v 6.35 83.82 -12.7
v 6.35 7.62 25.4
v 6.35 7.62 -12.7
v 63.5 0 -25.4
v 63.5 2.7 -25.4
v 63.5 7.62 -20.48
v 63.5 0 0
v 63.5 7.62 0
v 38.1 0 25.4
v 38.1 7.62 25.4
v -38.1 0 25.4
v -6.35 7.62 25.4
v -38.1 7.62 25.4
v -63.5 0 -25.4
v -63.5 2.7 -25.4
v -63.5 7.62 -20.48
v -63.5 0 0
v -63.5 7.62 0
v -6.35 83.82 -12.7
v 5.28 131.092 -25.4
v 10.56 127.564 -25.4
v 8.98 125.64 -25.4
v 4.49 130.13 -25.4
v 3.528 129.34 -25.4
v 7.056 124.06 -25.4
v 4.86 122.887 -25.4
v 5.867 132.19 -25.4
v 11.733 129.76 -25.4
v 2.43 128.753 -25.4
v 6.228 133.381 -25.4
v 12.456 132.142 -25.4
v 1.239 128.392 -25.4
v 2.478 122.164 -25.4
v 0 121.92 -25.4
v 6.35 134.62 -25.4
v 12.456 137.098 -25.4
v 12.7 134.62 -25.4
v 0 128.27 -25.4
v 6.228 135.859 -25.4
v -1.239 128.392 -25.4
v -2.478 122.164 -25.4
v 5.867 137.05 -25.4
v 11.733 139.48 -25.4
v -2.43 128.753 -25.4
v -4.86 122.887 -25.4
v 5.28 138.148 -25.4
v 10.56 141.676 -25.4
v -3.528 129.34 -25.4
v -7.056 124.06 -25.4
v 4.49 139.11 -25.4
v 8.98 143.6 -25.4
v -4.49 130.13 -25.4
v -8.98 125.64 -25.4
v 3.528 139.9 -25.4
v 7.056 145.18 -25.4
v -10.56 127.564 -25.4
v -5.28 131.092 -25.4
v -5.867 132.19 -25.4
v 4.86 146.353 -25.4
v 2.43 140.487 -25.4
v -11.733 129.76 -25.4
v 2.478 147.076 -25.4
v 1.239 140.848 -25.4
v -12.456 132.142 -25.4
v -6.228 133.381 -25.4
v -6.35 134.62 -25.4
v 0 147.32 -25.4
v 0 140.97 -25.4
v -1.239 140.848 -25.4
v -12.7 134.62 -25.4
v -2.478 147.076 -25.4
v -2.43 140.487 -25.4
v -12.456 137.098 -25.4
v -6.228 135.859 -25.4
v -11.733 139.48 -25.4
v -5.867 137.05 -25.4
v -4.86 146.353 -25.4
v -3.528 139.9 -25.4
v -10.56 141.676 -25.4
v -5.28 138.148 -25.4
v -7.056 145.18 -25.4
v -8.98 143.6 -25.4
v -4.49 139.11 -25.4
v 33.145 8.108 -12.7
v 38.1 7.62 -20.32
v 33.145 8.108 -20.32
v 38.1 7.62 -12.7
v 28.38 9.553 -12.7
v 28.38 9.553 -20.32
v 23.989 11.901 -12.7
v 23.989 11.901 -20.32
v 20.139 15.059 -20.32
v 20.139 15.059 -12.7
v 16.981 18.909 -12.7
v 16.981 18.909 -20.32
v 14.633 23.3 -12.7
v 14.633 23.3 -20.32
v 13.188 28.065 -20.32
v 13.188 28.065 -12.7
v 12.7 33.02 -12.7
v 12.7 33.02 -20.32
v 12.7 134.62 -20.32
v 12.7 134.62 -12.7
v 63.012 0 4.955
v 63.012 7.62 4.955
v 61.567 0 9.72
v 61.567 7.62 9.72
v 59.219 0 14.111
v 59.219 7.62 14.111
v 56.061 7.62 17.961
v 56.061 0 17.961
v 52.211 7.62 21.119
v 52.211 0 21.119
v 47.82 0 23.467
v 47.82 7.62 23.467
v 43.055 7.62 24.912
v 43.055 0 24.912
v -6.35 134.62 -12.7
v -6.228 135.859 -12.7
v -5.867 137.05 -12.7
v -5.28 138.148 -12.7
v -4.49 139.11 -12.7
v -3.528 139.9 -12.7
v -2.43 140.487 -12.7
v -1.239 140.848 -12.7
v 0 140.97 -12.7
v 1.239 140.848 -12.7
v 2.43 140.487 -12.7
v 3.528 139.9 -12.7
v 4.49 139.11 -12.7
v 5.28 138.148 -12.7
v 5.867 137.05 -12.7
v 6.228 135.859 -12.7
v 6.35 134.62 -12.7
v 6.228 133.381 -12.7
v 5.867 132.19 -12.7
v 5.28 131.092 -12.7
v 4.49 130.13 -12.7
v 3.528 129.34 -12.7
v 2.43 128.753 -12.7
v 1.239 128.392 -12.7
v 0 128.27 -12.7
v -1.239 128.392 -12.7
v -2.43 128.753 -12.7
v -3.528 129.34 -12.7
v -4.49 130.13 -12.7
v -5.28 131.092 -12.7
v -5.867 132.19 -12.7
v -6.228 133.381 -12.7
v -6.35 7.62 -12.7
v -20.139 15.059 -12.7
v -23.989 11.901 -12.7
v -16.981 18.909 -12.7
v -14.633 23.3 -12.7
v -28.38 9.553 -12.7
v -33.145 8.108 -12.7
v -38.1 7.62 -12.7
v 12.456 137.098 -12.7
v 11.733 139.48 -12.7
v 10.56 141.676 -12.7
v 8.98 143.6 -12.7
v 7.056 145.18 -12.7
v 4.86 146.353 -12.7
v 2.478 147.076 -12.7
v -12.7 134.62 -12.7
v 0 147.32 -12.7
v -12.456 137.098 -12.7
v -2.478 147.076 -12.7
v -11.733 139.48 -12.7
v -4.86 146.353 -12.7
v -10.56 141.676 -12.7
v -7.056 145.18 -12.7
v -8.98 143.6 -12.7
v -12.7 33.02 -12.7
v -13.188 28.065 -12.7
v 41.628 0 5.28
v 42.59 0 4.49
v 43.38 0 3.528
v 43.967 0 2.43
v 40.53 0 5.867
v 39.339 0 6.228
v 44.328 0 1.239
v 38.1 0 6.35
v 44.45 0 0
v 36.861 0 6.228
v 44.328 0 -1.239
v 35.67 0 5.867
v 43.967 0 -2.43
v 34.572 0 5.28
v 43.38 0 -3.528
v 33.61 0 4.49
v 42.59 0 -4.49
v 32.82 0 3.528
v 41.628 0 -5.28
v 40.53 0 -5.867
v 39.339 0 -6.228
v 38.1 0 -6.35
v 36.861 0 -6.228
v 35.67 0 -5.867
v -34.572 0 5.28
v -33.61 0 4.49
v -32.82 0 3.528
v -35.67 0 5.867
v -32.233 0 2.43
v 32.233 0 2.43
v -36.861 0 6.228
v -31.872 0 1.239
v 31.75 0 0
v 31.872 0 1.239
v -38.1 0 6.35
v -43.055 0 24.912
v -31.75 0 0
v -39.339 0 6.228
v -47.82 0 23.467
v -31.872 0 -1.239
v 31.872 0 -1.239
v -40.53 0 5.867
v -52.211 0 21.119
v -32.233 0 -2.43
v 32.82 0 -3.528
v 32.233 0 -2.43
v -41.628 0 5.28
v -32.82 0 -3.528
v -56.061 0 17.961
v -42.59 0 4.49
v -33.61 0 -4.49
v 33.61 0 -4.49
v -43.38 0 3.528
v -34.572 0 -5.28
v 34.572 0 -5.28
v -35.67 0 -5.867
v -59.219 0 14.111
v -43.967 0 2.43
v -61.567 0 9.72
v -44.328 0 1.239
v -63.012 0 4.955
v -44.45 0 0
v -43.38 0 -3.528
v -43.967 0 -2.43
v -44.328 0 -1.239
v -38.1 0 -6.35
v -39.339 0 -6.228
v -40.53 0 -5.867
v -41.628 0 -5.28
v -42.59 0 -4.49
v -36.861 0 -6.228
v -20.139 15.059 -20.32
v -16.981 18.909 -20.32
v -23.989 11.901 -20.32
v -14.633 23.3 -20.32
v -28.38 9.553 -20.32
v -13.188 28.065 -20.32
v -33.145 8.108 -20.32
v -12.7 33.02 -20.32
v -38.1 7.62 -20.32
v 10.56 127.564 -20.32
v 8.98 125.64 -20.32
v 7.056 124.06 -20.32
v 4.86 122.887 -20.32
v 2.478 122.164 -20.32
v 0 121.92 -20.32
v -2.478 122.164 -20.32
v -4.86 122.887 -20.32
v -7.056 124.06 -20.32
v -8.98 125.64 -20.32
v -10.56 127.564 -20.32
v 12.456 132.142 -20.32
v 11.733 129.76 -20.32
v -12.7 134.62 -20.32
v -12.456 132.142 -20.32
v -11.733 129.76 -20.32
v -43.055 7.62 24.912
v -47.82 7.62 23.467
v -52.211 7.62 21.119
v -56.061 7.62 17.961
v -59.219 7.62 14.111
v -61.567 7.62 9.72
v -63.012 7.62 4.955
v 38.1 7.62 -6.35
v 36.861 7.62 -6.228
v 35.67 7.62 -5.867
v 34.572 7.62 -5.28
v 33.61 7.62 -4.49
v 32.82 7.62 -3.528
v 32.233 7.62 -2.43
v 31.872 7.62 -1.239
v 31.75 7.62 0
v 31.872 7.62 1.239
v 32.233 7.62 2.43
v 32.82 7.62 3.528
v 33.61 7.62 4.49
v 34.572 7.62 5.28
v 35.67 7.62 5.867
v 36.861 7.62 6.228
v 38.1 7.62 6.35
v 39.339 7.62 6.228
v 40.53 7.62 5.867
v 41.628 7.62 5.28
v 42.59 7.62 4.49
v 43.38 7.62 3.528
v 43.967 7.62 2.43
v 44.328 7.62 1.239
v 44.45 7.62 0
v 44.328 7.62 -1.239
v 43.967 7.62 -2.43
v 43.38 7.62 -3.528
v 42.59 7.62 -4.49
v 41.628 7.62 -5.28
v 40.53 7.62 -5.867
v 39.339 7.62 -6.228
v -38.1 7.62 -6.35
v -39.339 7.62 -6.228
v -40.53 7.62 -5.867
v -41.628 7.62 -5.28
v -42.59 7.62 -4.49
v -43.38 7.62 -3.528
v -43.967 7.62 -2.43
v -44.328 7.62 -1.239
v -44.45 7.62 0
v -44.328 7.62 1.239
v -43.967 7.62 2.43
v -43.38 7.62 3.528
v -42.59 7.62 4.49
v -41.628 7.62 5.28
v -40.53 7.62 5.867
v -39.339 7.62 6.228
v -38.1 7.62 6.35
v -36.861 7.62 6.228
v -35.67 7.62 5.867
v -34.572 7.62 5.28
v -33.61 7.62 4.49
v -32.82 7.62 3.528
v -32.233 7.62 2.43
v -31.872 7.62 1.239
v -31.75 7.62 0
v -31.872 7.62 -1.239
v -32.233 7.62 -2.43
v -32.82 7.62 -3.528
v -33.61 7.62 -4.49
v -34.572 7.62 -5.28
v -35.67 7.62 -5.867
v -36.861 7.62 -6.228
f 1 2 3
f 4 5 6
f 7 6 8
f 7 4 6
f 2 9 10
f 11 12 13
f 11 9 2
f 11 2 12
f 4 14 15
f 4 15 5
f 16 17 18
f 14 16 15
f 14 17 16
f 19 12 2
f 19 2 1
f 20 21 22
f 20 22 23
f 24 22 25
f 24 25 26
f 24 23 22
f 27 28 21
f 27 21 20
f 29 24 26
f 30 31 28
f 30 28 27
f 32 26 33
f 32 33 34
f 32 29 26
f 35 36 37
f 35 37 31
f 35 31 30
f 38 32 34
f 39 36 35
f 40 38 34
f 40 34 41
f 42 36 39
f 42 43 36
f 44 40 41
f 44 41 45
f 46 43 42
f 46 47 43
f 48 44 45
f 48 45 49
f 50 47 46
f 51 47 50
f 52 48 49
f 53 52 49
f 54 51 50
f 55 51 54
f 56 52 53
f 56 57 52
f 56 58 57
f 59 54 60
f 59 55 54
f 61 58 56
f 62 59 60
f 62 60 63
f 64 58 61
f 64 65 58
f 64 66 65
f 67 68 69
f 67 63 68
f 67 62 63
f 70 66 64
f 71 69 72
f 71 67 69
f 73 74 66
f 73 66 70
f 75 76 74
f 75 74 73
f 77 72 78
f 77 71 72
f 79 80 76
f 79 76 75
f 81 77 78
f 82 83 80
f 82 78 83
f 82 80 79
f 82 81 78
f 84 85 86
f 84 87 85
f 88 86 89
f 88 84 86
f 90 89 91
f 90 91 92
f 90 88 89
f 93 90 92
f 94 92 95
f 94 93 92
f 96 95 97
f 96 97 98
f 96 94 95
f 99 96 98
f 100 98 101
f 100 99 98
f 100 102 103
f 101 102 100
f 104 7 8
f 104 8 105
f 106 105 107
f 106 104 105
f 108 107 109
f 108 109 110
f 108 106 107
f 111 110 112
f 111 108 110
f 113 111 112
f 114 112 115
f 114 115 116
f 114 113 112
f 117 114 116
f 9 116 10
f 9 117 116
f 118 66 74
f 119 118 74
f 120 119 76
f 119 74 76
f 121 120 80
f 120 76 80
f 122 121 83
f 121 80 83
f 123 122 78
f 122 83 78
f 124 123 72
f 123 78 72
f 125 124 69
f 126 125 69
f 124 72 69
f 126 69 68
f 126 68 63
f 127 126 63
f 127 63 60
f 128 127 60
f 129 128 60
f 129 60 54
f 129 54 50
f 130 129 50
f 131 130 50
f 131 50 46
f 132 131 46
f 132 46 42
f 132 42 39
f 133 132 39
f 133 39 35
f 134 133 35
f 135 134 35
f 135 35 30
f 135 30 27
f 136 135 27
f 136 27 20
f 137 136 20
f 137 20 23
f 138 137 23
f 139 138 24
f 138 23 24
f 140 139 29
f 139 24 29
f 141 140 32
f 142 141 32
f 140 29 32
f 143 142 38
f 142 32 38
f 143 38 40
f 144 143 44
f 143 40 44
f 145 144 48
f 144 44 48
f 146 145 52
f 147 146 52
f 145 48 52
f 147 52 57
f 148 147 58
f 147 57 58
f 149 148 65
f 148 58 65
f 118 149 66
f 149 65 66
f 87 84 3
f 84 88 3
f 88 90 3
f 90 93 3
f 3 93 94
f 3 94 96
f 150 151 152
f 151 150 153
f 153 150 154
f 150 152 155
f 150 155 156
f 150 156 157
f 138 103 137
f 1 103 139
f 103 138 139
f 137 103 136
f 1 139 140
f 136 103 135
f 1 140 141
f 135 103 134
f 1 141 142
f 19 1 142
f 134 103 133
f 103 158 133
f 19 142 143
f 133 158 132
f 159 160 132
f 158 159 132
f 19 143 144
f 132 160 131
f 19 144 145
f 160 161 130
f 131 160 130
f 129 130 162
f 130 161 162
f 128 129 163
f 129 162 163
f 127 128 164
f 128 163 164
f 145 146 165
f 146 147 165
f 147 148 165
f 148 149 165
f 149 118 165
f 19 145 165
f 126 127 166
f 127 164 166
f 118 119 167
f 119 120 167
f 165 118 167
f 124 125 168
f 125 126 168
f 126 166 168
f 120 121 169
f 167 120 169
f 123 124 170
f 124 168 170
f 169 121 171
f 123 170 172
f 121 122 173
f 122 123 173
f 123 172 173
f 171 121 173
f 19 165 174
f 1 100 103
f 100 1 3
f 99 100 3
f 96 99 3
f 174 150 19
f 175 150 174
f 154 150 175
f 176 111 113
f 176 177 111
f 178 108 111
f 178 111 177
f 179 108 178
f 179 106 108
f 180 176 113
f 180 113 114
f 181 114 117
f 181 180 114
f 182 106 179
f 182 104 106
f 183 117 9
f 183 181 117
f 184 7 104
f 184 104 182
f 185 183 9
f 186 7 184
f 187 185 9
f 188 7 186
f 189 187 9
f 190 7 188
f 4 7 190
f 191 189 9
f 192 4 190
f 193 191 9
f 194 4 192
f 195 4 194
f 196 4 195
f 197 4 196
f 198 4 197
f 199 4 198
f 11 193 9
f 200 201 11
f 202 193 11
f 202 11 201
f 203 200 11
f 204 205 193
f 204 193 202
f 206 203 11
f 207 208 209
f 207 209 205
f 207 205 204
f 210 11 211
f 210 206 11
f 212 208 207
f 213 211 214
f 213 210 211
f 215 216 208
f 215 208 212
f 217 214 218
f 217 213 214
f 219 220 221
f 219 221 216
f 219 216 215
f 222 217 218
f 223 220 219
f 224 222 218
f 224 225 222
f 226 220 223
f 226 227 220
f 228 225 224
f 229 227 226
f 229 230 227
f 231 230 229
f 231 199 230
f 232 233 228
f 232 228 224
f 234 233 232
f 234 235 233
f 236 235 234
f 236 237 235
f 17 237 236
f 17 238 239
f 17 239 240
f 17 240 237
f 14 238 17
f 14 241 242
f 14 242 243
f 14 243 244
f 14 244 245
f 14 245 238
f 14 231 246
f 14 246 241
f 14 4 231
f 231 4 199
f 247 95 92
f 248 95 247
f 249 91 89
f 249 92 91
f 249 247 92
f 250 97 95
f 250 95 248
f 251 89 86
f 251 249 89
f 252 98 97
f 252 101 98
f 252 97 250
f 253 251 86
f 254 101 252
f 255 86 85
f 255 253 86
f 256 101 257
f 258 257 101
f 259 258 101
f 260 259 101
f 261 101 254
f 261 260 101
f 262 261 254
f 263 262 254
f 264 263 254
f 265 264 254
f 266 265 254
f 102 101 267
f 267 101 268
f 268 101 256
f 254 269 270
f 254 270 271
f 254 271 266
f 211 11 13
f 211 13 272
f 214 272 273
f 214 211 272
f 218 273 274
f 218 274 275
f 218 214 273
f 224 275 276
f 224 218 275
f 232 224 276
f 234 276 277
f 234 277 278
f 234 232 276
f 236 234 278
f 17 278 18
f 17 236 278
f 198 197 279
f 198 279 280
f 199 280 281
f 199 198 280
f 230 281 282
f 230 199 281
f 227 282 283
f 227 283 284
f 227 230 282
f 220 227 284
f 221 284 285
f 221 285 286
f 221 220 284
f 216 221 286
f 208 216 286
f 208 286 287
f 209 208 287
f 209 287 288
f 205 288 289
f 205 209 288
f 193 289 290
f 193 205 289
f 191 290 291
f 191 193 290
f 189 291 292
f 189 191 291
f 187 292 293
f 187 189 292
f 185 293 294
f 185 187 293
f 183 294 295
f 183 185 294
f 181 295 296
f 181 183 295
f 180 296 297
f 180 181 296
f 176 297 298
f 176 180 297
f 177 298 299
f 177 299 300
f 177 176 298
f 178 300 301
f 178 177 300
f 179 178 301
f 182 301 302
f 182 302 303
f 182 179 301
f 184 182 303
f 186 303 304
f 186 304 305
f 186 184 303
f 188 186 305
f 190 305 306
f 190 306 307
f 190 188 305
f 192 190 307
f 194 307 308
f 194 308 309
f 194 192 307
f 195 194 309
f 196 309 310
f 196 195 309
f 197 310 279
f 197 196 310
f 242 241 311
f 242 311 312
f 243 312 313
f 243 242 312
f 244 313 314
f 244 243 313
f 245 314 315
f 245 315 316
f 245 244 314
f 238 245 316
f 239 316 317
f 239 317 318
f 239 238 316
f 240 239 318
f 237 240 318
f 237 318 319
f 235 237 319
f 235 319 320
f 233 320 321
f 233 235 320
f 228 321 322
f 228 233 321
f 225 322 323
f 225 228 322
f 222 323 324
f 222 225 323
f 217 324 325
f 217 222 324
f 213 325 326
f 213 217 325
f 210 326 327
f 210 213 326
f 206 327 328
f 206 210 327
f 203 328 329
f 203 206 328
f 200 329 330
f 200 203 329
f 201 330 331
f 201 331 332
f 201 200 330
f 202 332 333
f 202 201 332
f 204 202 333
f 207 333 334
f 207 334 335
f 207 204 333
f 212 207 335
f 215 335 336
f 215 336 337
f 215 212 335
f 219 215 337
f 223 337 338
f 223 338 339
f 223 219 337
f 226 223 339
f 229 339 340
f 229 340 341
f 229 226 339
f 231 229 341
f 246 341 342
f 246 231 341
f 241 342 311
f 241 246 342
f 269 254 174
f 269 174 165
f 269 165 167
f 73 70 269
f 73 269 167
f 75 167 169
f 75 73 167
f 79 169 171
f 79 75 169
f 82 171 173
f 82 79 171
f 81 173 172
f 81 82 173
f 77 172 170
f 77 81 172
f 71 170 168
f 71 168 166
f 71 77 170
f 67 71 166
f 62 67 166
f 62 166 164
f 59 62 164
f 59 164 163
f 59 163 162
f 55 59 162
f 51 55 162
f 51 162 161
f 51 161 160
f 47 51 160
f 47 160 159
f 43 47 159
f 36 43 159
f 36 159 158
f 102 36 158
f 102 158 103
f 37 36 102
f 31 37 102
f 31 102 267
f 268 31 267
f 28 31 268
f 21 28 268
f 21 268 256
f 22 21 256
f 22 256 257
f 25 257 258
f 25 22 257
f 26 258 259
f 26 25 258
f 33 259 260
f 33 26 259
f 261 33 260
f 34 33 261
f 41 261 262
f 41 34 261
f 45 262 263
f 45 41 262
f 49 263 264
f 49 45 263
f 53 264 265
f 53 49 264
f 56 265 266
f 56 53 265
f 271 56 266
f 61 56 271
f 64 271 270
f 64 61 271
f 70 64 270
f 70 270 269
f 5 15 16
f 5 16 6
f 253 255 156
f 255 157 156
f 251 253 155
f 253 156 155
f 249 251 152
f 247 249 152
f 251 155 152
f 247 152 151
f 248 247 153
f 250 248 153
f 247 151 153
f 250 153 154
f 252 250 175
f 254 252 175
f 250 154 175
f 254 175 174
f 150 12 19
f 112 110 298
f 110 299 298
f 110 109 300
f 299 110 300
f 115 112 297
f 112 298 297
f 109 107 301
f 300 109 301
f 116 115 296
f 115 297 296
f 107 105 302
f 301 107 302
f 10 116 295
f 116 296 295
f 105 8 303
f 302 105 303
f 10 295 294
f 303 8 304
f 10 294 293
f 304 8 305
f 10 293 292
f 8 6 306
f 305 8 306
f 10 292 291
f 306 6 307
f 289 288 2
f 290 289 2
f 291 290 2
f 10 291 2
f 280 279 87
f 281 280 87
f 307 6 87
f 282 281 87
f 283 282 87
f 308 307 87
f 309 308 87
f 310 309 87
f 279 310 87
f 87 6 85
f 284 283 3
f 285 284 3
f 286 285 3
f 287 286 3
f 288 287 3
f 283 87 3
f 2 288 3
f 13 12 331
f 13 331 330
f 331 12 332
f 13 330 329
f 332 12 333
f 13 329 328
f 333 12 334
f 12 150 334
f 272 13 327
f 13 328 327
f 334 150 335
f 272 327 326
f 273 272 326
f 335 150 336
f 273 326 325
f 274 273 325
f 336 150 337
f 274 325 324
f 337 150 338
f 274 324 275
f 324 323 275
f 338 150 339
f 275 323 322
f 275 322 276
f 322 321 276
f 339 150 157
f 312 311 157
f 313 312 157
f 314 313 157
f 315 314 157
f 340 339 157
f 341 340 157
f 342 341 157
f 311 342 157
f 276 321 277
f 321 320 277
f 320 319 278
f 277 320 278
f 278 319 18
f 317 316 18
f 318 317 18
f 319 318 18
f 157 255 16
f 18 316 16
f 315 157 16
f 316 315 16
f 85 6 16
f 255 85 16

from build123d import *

# Parameters (mm, degrees)
SKETCH1_R           = 6.35
BOSS_EXTRUDE1_DEPTH = 7.62
BOSS_EXTRUDE2_START = -5.08
SKETCH4_R           = 6.35
BOSS_EXTRUDE2_DEPTH = 7.62
BOSS_EXTRUDE3_START = 0
SKETCH4_3_R         = 6.35
BOSS_EXTRUDE3_DEPTH = 5.08
FILLET1_R           = 25.4
RIB1_REACH          = 164.421
SKETCH5_WALL_W      = 412.036258646
SKETCH5_WALL_H      = 12.7
CHAMFER1_SIZE       = 4.92


with BuildPart() as part:
    # Sketch1 → Boss-Extrude1 (new body)
    with BuildSketch(Plane(origin=(0, 0, 0), x_dir=(1, 0, 0), z_dir=(0, 1, 0))):
        with BuildLine():
            Line((-63.5, 25.4), (63.5, 25.4))
            Line((63.5, 25.4), (63.5, 0))
            ThreePointArc((63.5, 0), (56.060512242, -17.960512242), (38.1, -25.4))
            Line((38.1, -25.4), (-38.1, -25.4))
            ThreePointArc((-38.1, -25.4), (-56.060512242, -17.960512242), (-63.5, 0))
            Line((-63.5, 0), (-63.5, 25.4))
        make_face()
        with Locations((-38.1, 0)):
            Circle(SKETCH1_R, mode=Mode.SUBTRACT)
        with Locations((38.1, 0)):
            Circle(SKETCH1_R, mode=Mode.SUBTRACT)
    extrude(amount=BOSS_EXTRUDE1_DEPTH)

    # Sketch4 → Boss-Extrude2 (add)
    with BuildSketch(Plane(origin=(0, 0, -25.4), x_dir=(-1, 0, 0), z_dir=(0, 0, -1)).offset(BOSS_EXTRUDE2_START)):
        with BuildLine():
            ThreePointArc((12.7, 134.62), (0, 147.32), (-12.7, 134.62))
            Line((-12.7, 134.62), (-12.7, 7.62))
            Line((-12.7, 7.62), (12.7, 7.62))
            Line((12.7, 7.62), (12.7, 134.62))
        make_face()
        with Locations((0, 134.62)):
            Circle(SKETCH4_R, mode=Mode.SUBTRACT)
    extrude(amount=-BOSS_EXTRUDE2_DEPTH)

    # Sketch4<3> → Boss-Extrude3 (add)
    with BuildSketch(Plane(origin=(0, 0, -25.4), x_dir=(-1, 0, 0), z_dir=(0, 0, -1)).offset(BOSS_EXTRUDE3_START)):
        with BuildLine():
            ThreePointArc((-12.7, 134.62), (0, 121.92), (12.7, 134.62))
            ThreePointArc((12.7, 134.62), (0, 147.32), (-12.7, 134.62))
        make_face()
        with Locations((0, 134.62)):
            Circle(SKETCH4_3_R, mode=Mode.SUBTRACT)
    extrude(amount=-BOSS_EXTRUDE3_DEPTH)

    # Fillet1
    fillet1_edges = [part.edges().sort_by_distance(p)[0] for p in [
        (-12.7, 7.62, -16.51),
        (12.7, 7.62, -16.51),
    ]]
    fillet(fillet1_edges, radius=FILLET1_R)

    # Sketch5 wall → Rib1 (add, up to next)
    with BuildSketch(Plane(origin=(0, 45.72, 6.35), x_dir=(0, 0.894427191, -0.4472135955), z_dir=(0, 0.4472135955, 0.894427191)), mode=Mode.PRIVATE) as rib1_sk1:
        Rectangle(SKETCH5_WALL_W, SKETCH5_WALL_H)
    rib1_tool1 = extrude(rib1_sk1.sketch, amount=-RIB1_REACH, mode=Mode.PRIVATE) - part.part
    add(rib1_tool1.solids().sort_by_distance((0, 45.72, 6.35))[0])

    # Chamfer1
    chamfer1_edges = [part.edges().sort_by_distance(p)[0] for p in [
        (0, 7.62, -25.4),
    ]]
    chamfer(chamfer1_edges, length=CHAMFER1_SIZE)


solid = part.part
